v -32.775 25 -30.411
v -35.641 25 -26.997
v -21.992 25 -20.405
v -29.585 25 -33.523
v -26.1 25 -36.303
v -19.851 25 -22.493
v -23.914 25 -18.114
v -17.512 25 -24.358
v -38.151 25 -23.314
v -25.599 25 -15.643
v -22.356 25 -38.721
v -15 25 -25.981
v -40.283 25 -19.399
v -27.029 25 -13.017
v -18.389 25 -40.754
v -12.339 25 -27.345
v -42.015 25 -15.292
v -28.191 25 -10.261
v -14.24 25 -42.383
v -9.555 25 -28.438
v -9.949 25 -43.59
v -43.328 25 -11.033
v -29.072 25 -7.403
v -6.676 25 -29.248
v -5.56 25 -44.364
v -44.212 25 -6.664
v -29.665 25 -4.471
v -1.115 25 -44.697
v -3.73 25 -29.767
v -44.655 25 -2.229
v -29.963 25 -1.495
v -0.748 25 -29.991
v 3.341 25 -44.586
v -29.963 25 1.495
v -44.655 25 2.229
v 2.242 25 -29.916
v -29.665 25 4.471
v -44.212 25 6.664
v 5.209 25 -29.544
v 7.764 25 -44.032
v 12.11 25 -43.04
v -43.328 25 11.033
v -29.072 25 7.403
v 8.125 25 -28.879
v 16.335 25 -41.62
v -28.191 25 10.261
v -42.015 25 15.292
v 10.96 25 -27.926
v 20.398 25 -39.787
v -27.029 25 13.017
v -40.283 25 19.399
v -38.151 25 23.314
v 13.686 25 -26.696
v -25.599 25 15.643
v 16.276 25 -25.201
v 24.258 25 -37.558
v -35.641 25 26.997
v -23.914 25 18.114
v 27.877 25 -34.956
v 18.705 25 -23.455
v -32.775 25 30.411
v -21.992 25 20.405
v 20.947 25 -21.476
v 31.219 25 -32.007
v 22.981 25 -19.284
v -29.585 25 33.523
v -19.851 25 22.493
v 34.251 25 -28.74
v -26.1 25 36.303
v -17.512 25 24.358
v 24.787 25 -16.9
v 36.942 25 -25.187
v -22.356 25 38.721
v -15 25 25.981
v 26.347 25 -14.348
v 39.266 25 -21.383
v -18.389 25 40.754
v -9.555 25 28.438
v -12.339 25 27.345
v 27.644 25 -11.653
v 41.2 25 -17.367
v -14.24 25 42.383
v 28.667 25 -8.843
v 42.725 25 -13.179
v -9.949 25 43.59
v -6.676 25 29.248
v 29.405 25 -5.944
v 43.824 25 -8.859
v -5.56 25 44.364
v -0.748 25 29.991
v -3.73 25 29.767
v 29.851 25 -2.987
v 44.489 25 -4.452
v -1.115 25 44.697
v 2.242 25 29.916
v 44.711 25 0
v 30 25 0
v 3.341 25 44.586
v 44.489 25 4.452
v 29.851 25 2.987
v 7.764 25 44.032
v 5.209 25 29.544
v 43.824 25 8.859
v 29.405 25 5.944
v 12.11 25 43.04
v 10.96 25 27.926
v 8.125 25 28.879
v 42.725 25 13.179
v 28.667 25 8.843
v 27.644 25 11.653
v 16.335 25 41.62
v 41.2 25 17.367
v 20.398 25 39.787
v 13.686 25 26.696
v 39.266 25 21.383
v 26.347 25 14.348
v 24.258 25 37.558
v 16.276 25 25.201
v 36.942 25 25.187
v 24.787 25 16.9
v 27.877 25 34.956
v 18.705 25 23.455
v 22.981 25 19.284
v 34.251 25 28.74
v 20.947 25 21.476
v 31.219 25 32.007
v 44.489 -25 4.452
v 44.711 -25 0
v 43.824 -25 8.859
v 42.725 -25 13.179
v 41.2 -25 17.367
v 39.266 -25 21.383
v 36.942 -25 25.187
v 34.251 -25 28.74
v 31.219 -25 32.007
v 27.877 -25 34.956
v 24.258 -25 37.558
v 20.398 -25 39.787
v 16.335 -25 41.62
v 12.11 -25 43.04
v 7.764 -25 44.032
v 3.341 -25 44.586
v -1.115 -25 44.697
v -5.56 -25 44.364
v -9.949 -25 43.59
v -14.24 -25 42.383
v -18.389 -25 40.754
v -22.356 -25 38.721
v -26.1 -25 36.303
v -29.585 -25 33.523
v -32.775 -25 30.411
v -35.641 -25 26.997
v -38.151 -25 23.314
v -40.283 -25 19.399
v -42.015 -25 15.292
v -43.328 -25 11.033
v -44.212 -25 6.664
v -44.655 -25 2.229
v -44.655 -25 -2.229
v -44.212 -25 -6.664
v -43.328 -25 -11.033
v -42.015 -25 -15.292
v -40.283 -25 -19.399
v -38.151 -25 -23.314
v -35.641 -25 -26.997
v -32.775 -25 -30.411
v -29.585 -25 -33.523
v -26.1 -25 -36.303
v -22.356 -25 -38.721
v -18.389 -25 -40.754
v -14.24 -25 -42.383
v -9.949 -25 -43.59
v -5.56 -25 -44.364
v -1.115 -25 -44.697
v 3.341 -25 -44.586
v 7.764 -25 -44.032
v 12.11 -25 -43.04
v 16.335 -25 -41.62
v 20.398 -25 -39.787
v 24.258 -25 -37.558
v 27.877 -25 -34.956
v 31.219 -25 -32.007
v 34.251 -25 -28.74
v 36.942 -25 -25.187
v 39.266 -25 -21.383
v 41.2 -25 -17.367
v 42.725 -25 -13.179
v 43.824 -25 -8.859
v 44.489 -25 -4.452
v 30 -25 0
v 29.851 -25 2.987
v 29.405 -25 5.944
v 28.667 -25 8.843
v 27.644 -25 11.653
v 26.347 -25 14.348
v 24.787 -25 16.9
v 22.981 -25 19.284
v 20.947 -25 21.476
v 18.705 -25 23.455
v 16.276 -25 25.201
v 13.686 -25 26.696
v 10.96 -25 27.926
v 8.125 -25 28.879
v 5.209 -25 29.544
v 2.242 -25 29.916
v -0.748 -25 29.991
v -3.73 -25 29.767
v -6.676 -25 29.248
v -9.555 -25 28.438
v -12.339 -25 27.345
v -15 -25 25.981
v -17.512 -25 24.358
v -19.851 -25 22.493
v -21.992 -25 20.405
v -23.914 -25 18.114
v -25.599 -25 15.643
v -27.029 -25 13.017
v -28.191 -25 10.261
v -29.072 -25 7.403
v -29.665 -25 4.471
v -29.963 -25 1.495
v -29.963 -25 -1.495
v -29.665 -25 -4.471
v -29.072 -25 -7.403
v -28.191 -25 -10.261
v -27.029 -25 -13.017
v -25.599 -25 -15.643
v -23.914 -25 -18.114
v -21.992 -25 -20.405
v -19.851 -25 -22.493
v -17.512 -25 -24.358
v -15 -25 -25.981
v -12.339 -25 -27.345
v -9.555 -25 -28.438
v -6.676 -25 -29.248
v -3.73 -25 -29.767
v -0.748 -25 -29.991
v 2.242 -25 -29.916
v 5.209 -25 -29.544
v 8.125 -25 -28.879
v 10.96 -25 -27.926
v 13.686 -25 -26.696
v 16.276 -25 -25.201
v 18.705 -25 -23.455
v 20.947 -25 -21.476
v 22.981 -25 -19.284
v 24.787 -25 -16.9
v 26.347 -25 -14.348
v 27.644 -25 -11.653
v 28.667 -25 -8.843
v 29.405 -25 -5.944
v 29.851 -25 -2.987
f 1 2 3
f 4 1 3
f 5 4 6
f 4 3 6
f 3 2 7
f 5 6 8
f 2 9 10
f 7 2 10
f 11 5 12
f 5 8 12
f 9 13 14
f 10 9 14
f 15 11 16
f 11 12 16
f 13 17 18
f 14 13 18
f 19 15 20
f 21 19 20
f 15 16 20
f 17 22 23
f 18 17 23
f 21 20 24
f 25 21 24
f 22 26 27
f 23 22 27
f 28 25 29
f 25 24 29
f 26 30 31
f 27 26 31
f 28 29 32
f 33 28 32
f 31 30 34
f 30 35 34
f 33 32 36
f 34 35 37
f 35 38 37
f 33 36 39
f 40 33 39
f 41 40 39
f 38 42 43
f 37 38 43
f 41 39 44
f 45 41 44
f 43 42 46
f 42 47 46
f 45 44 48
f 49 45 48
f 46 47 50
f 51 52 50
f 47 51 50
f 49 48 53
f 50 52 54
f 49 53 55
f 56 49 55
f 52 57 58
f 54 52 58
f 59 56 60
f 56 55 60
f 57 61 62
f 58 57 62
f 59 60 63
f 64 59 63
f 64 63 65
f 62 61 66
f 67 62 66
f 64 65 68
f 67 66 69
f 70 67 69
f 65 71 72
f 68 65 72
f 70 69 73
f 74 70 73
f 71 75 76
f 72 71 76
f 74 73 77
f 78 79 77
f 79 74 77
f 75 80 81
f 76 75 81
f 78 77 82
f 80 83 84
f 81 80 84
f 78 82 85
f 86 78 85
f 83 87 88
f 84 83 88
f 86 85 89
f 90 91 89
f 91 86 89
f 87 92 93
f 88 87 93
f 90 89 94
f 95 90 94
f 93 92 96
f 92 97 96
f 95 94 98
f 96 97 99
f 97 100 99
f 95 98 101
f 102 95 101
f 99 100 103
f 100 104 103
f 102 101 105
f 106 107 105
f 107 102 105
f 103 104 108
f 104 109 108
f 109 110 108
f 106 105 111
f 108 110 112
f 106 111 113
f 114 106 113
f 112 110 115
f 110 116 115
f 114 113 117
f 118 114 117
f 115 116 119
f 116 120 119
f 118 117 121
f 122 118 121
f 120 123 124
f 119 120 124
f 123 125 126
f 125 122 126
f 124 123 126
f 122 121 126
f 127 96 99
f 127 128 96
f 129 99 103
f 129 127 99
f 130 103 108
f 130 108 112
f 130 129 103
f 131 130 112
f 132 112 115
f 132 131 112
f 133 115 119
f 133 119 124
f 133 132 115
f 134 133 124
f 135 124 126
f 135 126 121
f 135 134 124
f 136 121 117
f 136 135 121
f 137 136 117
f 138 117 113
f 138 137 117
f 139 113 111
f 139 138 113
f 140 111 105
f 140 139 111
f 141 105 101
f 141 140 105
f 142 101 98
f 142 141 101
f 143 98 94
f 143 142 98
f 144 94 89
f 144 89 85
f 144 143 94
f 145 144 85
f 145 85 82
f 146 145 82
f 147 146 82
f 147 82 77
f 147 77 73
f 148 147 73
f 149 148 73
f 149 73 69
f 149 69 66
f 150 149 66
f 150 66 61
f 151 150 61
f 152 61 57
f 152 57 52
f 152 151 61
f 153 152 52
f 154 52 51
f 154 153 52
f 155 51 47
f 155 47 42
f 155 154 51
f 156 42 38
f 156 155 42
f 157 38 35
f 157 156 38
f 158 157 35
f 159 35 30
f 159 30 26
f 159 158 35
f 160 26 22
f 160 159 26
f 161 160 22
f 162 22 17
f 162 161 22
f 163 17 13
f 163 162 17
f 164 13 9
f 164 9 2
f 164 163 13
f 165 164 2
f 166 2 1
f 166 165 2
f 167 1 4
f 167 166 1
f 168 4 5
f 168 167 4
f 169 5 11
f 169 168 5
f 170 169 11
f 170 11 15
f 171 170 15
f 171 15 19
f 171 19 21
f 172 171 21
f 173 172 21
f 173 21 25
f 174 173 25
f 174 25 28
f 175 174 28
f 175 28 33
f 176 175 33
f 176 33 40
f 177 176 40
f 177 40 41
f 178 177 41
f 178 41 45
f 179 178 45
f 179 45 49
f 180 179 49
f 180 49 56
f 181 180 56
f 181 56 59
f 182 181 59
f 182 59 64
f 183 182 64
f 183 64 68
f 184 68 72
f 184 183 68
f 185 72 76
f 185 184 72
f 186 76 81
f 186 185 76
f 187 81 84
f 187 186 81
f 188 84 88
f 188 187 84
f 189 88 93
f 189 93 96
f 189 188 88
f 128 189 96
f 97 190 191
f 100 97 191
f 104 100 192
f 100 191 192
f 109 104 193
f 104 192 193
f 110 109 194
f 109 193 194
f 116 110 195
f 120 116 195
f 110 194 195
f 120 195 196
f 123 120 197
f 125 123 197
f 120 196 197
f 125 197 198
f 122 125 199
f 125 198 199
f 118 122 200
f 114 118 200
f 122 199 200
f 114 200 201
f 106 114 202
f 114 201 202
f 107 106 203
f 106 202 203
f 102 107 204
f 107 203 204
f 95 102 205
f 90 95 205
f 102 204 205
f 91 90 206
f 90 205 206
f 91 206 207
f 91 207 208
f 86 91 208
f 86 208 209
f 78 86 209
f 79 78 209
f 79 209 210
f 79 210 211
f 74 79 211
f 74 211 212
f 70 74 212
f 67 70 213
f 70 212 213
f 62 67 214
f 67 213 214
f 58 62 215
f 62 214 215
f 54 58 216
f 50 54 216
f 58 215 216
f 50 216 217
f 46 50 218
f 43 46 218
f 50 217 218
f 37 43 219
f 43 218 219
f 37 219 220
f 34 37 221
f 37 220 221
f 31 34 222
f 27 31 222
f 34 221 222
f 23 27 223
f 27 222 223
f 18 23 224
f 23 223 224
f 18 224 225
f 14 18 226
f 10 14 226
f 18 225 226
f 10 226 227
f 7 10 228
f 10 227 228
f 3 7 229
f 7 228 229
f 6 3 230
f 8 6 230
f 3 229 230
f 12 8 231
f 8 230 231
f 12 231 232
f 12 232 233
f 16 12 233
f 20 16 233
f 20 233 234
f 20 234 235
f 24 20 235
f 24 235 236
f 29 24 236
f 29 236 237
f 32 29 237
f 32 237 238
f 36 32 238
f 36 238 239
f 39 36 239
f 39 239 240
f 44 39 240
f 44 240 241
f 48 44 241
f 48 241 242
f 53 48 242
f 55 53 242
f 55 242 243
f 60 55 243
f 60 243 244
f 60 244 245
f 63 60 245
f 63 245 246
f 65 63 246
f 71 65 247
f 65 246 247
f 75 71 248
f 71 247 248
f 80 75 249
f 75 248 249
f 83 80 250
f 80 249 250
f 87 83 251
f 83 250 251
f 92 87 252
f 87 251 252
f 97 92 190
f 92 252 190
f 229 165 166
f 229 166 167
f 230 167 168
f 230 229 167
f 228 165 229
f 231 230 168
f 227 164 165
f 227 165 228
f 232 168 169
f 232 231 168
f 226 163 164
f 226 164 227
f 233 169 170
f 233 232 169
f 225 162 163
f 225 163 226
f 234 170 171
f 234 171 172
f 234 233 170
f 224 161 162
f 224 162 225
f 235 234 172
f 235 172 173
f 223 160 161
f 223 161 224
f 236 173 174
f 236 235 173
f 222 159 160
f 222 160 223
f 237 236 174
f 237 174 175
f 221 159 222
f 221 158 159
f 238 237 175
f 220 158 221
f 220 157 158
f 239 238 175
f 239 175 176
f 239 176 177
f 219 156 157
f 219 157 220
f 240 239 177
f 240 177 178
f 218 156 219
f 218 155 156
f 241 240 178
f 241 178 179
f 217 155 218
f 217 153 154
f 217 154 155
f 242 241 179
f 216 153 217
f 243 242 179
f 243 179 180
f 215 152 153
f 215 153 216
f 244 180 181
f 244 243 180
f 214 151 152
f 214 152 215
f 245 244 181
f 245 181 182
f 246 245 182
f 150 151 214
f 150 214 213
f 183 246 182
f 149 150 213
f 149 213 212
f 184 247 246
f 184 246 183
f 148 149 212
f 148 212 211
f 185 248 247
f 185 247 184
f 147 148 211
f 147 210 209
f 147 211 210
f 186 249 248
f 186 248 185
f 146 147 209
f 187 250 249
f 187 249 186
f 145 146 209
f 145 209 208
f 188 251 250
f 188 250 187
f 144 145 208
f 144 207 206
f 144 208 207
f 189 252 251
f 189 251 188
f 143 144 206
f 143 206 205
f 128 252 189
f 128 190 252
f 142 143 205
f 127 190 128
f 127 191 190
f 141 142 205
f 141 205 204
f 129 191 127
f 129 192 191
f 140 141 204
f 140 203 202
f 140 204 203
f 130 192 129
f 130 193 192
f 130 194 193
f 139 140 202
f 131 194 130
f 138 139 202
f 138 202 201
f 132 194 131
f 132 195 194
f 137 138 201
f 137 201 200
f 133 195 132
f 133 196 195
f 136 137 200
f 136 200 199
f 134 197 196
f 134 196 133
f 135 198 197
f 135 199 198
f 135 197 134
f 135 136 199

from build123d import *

# Parameters (mm, degrees)
F0_R     = 44.711007
F1_DEPTH = 25
F3_R     = 30
F4_DEPTH = 50


with BuildPart() as f1:
    # F0 (on Front) → F1 (new body)
    with BuildSketch(Plane.XZ):
        Circle(F0_R)
    extrude(amount=F1_DEPTH)

    # F2: F1 across face


with BuildPart() as f1_1:
    add(f1.part)
    add(f1.part.mirror(Plane(origin=(0, 0, 0), x_dir=(1, 0, 0), z_dir=(0, 1, 0))))

    # F3 (on face) → F4 (cut)
    with BuildSketch(Plane.XZ.offset(25)):
        Circle(F3_R)
    extrude(amount=-F4_DEPTH, mode=Mode.SUBTRACT)


solid = f1_1.part
